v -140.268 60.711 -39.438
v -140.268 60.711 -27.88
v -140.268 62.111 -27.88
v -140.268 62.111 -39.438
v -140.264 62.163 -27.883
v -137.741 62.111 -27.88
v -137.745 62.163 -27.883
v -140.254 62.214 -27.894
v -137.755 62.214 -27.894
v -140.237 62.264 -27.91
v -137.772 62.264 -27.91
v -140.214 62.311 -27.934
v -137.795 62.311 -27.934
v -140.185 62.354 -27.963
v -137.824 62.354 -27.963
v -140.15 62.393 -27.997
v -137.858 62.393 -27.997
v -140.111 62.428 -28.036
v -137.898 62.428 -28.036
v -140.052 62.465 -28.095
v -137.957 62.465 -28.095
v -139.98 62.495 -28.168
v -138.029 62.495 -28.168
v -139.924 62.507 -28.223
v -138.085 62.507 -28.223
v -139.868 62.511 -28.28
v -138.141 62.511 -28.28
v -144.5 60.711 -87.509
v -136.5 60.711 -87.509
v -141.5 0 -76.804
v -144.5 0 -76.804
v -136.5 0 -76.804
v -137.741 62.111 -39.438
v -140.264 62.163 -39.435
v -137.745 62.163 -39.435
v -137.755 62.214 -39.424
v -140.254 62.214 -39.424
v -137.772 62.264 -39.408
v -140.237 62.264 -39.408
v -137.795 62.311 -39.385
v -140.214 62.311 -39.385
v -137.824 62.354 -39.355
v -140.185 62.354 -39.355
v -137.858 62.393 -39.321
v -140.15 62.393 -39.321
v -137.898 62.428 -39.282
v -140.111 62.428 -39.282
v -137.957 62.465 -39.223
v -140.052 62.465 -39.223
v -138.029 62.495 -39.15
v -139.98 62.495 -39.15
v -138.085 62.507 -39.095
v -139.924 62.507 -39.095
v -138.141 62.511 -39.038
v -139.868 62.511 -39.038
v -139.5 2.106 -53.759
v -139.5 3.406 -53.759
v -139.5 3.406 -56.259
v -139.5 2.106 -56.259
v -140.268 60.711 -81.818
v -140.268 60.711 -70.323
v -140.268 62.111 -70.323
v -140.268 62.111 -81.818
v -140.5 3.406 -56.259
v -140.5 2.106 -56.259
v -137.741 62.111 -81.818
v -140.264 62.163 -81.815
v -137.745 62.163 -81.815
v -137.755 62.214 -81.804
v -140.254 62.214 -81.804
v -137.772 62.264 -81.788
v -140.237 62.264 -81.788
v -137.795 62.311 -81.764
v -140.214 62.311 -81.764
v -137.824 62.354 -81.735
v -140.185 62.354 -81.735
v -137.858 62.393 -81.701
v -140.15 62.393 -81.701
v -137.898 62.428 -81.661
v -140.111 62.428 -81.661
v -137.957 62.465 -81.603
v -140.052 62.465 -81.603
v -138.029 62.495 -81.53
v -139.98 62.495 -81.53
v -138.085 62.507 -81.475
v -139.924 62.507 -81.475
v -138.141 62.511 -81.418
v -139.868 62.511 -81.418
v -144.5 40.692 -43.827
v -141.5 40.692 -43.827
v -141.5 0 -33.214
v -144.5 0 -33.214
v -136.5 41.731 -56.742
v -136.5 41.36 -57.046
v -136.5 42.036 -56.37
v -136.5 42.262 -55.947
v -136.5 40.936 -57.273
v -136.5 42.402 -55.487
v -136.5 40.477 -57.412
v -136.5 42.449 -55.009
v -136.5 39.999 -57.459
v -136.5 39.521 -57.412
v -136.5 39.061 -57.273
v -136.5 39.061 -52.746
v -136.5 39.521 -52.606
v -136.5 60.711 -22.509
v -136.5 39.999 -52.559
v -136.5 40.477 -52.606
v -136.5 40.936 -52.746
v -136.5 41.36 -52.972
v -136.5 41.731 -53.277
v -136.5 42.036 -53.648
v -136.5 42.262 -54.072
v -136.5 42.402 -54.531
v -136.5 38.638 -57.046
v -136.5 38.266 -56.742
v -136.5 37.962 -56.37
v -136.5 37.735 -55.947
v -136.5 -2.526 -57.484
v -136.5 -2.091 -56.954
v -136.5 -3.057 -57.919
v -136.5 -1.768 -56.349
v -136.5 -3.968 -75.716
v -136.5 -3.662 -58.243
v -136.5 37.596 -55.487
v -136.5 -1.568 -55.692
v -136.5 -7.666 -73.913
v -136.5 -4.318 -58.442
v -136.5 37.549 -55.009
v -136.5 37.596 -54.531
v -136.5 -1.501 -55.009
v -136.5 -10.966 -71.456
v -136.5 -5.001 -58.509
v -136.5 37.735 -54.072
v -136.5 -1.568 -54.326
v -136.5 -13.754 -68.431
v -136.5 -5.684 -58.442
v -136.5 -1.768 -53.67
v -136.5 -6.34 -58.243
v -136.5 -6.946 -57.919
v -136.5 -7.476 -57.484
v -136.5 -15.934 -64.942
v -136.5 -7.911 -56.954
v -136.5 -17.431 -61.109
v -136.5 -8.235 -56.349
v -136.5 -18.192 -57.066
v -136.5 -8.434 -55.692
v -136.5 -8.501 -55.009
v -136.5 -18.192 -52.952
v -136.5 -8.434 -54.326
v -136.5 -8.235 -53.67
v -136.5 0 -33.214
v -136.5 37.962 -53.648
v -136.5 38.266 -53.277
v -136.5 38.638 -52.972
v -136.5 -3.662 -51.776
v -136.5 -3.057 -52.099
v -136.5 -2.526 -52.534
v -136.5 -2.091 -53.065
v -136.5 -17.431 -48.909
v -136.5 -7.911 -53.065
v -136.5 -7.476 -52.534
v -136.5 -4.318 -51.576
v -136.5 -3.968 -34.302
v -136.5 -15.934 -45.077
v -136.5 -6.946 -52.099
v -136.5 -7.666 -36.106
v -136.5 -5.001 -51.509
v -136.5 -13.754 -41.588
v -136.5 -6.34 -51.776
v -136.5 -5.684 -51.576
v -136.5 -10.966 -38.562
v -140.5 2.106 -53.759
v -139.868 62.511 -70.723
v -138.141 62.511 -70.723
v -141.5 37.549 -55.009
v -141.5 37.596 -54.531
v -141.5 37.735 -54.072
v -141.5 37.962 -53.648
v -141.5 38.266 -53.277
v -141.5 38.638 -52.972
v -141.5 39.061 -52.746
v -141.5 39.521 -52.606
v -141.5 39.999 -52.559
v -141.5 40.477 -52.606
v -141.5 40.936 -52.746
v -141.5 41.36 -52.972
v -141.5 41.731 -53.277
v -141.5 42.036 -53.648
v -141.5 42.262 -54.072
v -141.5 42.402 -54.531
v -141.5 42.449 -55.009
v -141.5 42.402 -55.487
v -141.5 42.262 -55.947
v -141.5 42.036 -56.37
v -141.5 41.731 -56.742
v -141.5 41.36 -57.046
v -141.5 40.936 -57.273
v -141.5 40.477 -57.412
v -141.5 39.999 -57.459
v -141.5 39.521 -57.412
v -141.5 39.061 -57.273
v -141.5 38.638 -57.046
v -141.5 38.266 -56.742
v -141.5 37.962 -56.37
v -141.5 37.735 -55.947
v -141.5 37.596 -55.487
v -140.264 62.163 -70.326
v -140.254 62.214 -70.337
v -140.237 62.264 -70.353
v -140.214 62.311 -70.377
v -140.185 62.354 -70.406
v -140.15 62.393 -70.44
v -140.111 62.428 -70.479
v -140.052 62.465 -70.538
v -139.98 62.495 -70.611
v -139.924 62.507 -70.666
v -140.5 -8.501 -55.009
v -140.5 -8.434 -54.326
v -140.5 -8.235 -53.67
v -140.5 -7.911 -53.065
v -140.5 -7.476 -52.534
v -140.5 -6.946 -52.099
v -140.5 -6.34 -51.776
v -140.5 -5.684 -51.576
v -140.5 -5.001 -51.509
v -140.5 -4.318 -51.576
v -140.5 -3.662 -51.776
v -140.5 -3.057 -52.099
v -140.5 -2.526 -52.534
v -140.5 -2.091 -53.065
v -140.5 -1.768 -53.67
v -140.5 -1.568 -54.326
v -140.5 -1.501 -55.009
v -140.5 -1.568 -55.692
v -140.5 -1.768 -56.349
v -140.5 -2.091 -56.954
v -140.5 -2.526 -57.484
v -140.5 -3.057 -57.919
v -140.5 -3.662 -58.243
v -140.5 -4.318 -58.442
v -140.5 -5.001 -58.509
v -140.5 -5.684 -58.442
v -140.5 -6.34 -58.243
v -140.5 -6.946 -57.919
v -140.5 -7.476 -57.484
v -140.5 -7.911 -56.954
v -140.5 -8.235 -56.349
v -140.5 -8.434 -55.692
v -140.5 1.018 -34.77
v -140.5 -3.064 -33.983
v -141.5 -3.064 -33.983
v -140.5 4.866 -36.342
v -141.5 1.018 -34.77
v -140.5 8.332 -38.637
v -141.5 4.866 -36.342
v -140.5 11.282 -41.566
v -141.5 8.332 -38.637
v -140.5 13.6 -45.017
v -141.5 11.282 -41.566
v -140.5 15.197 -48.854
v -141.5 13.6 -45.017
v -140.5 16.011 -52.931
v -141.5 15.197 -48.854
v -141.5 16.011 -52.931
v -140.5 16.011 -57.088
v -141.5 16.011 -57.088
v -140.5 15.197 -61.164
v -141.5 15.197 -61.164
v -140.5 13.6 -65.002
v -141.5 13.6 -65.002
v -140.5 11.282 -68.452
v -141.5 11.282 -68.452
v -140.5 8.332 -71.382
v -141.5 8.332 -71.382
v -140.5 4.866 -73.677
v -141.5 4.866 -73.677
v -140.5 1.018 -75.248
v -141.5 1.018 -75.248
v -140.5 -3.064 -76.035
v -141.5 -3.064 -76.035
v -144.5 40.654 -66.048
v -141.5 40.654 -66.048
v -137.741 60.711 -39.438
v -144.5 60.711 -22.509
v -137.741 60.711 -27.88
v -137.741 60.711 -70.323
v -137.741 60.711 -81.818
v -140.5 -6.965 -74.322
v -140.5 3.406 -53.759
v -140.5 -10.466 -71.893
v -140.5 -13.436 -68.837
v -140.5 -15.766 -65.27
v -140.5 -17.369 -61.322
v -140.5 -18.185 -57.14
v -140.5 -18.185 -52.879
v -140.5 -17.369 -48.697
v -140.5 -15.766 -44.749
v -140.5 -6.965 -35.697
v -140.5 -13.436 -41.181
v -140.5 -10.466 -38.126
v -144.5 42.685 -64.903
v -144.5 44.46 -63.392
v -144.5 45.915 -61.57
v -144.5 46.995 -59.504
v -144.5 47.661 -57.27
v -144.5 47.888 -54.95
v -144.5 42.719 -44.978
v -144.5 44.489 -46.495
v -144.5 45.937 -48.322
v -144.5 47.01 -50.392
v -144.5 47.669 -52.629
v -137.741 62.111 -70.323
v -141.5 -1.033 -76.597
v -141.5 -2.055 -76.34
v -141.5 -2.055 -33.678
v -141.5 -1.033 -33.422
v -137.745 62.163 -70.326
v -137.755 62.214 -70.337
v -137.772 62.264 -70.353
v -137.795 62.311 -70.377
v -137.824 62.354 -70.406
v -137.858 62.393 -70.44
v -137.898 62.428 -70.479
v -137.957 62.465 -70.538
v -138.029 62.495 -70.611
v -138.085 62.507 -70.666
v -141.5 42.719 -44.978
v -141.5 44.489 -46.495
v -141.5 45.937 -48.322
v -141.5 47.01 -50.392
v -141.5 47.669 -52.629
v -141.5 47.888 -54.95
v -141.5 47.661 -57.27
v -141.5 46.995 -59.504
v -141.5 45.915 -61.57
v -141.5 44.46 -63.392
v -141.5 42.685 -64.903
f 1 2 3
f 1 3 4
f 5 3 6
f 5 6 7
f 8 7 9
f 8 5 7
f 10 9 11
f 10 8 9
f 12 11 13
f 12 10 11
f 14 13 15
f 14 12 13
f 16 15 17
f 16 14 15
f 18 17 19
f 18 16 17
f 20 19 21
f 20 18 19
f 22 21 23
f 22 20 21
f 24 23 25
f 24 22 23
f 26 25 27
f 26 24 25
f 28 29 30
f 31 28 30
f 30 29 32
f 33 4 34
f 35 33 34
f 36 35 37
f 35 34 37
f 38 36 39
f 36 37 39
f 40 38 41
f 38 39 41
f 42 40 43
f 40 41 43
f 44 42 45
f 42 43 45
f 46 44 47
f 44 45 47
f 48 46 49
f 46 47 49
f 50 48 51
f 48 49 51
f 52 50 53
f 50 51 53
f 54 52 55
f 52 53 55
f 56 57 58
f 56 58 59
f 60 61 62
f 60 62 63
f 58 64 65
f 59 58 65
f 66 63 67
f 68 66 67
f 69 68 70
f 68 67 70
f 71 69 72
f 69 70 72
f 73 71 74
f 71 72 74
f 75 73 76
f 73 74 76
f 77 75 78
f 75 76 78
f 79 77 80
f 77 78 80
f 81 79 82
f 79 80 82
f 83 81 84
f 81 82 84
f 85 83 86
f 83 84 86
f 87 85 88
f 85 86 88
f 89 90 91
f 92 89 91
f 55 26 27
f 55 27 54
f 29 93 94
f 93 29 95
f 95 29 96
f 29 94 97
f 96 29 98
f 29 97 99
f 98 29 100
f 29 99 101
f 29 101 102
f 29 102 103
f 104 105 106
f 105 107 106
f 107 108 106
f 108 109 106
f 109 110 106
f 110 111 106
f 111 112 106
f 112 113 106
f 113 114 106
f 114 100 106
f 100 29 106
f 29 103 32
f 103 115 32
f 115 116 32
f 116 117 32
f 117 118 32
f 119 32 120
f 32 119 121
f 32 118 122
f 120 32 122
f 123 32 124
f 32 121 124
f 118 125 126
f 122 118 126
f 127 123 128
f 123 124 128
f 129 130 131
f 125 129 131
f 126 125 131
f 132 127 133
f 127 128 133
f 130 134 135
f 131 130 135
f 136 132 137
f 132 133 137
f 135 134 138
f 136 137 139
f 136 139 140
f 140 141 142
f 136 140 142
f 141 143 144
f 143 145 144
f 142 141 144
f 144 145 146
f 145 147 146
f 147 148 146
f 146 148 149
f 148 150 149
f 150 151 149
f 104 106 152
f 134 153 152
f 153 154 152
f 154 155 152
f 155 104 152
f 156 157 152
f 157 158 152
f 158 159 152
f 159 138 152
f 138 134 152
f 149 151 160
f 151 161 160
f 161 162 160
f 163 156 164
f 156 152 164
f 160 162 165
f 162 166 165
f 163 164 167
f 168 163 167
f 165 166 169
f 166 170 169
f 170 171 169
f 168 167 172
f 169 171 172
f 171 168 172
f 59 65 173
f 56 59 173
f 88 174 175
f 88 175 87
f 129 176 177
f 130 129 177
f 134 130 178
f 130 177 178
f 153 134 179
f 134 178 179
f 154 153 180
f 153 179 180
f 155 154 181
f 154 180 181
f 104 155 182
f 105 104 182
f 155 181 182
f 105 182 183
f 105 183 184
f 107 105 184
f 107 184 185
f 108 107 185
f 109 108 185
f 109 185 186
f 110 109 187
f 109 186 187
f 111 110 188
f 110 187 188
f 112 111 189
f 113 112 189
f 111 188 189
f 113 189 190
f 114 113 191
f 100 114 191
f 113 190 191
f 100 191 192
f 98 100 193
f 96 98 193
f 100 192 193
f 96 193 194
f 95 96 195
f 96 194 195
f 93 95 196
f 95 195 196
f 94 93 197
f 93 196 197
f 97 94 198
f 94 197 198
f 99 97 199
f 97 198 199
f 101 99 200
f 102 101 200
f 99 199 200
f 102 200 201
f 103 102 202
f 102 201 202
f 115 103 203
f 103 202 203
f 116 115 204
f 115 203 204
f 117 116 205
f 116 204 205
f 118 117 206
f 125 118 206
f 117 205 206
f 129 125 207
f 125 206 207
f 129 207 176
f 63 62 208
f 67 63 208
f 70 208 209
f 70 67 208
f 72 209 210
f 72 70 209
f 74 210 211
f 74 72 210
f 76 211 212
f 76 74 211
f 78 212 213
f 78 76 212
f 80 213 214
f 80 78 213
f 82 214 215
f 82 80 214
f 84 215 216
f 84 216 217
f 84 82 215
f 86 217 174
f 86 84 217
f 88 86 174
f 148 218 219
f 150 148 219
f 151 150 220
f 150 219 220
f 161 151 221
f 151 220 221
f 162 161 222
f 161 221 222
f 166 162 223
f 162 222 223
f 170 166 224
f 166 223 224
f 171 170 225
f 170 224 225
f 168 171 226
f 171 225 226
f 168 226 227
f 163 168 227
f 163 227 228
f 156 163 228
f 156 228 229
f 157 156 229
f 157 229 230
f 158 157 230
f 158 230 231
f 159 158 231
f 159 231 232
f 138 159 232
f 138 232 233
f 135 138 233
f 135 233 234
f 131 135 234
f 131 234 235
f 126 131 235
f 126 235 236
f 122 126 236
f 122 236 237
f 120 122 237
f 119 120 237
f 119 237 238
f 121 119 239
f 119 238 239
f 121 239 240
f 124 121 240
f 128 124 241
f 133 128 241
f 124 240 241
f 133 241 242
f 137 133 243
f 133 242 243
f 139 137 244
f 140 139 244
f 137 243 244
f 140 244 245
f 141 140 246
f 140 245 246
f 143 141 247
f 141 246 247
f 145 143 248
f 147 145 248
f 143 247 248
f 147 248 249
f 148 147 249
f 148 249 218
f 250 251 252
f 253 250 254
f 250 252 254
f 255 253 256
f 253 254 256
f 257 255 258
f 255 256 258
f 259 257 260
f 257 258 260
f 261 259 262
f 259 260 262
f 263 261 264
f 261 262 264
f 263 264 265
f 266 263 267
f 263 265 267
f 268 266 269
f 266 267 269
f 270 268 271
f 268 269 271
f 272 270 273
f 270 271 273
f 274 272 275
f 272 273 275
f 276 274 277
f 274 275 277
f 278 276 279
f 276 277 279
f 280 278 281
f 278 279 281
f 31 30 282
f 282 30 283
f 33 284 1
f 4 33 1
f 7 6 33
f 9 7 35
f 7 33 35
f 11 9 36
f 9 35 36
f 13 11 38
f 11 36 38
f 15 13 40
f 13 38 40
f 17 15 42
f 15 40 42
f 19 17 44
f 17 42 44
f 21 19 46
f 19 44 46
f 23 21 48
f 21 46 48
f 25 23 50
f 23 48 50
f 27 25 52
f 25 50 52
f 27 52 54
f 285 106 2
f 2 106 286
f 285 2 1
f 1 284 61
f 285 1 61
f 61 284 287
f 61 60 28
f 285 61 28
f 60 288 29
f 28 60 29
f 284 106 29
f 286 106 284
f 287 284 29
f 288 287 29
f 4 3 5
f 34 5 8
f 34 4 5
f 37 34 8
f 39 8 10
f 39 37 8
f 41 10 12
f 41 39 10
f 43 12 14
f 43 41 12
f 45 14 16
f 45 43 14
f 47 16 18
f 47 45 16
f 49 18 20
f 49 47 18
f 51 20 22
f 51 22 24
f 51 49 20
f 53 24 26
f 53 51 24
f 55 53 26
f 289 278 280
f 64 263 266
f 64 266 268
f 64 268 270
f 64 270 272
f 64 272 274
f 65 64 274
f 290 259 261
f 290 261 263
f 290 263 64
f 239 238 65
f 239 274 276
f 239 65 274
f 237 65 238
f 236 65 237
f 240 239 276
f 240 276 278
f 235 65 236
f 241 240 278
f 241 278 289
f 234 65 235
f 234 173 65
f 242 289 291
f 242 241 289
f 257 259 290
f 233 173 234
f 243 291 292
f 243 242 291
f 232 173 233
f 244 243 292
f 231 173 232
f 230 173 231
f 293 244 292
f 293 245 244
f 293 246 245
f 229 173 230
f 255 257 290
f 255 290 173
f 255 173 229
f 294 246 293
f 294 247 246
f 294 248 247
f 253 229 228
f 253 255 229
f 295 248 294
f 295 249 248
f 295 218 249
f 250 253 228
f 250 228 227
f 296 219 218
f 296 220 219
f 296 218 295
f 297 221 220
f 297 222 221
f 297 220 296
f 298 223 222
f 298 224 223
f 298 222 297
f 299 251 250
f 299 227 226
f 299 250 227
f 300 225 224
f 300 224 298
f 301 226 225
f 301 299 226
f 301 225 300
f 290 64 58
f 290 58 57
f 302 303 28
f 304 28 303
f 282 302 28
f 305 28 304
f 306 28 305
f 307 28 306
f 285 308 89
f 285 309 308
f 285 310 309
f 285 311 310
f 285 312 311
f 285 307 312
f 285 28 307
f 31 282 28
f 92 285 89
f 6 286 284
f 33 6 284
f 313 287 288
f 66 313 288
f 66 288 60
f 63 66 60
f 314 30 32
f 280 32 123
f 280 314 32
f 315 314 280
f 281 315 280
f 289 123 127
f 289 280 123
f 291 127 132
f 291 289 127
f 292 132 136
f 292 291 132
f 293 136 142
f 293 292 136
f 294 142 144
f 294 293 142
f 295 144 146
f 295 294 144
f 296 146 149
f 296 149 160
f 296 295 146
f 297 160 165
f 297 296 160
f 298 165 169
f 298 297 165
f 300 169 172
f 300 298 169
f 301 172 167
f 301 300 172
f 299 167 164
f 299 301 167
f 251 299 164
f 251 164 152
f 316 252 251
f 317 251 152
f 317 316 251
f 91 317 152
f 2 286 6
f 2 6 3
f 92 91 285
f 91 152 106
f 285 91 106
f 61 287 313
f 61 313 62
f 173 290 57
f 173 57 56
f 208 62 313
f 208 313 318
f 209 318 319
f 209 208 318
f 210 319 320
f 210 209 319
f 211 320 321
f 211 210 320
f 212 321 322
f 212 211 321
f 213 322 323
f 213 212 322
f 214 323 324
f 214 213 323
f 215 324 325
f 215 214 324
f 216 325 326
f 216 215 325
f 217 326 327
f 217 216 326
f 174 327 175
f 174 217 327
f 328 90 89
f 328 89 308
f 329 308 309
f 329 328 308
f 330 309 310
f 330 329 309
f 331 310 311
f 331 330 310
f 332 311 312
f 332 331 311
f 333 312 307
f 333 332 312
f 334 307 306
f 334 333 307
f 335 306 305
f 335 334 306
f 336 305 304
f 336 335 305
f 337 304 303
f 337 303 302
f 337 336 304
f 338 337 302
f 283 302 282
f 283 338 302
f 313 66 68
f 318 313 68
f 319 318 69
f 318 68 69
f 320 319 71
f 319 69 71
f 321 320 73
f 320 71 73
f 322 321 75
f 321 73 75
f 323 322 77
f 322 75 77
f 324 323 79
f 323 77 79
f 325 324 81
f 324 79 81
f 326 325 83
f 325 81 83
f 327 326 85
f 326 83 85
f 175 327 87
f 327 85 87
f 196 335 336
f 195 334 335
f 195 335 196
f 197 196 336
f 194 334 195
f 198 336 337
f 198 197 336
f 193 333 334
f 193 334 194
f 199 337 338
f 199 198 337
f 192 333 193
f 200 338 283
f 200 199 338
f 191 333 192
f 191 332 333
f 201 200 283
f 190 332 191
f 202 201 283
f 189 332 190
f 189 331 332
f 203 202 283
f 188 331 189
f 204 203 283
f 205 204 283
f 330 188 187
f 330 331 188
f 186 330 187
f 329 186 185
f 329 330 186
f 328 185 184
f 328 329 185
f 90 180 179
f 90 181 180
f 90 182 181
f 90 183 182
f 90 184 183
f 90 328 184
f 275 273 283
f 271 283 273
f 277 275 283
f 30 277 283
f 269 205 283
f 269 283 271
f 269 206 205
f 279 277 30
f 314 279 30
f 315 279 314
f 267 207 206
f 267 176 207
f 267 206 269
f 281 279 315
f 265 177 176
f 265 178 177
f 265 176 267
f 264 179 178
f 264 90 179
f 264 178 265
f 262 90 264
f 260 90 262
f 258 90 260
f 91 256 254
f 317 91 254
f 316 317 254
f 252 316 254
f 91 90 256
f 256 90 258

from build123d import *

# Parameters (mm, degrees)
SKETCH029_R     = 3.5
SKETCH029_R_2   = 2.45
PAD016_DEPTH    = 5
PAD017_DEPTH    = 3
SKETCH032_R     = 21.114958
POCKET017_DEPTH = 1
SKETCH033_W     = 11.558153
SKETCH033_H     = 2.526367
SKETCH033_W_2   = 11.494995
PAD018_DEPTH    = 1.8
SKETCH034_W     = 1.3
SKETCH034_H     = 2.5
POCKET018_DEPTH = 1
FILLET002_R     = 0.4


with BuildPart() as part:
    # Sketch029 (on DatumPlane) → Pad016 (new body)
    with BuildSketch(Plane(origin=(-141.5, 0, 0), x_dir=(0, -1, 0), z_dir=(-1, 0, 0))):
        with BuildLine():
            Line((-60.710533, -22.509186), (-60.710533, -87.509186))
            Line((-60.710533, -87.509186), (0, -76.804281))
            ThreePointArc((0, -76.804281), (18.288256, -55.009186), (0, -33.214091))
            Line((-60.710533, -22.509186), (0, -33.214091))
        make_face()
        with Locations((5.001089, -55.009186)):
            Circle(SKETCH029_R, mode=Mode.SUBTRACT)
        with Locations((-39.998911, -55.009186)):
            Circle(SKETCH029_R_2, mode=Mode.SUBTRACT)
    extrude(amount=-PAD016_DEPTH)

    # Sketch031 (on Face7 of Pad016) → Pad017 (join)
    with BuildSketch(Plane(origin=(-141.5, 0, 0), x_dir=(0, -1, 0), z_dir=(-1, 0, 0))):
        with BuildLine():
            Line((0, -76.804281), (-40.654194, -66.047978))
            ThreePointArc((-40.691972, -43.826584), (-47.888023, -54.949547), (-40.654194, -66.047978))
            Line((-40.691972, -43.826584), (0, -33.214091))
            Line((0, -33.214091), (-60.710533, -22.509186))
            Line((-60.710533, -22.509186), (-60.710533, -87.509186))
            Line((-60.710533, -87.509186), (0, -76.804281))
        make_face()
    extrude(amount=PAD017_DEPTH)

    # Sketch032 (on Face12 of Pad017) → Pocket017 (cut)
    with BuildSketch(Plane(origin=(-141.5, 0, 0), x_dir=(0, -1, 0), z_dir=(-1, 0, 0))):
        with Locations((5.001089, -55.009186)):
            Circle(SKETCH032_R)
    extrude(amount=-POCKET017_DEPTH, mode=Mode.SUBTRACT)

    # Sketch033 (on Face1 of Pocket017) → Pad018 (join)
    with BuildSketch(Plane(origin=(-155, 60.710533, 0), x_dir=(0, 0, -1), z_dir=(0, 1, 0))):
        with Locations((33.659026, -15.995544)):
            Rectangle(SKETCH033_W, SKETCH033_H)
        with Locations((76.070472, -15.995544)):
            Rectangle(SKETCH033_W_2, SKETCH033_H)
    extrude(amount=PAD018_DEPTH)

    # Sketch034 (on Face24 of Pad018) → Pocket018 (cut)
    with BuildSketch(Plane(origin=(-140.5, 0, 0), x_dir=(0, -1, 0), z_dir=(-1, 0, 0))):
        with Locations((-2.756497, -55.009186)):
            Rectangle(SKETCH034_W, SKETCH034_H)
    extrude(amount=-POCKET018_DEPTH, mode=Mode.SUBTRACT)

    # Fillet002
    fillet002_edges = [part.edges().sort_by_distance(p)[0] for p in [
        (-140.267639, 62.510533, -76.070473),
        (-139.004456, 62.510533, -81.81797),
        (-137.741272, 62.510533, -76.070473),
        (-139.004456, 62.510533, -70.322975),
        (-140.267639, 62.510533, -33.659027),
        (-139.004456, 62.510533, -39.438103),
        (-137.741272, 62.510533, -33.659027),
        (-139.004456, 62.510533, -27.87995),
    ]]
    fillet(fillet002_edges, radius=FILLET002_R)


solid = part.part
